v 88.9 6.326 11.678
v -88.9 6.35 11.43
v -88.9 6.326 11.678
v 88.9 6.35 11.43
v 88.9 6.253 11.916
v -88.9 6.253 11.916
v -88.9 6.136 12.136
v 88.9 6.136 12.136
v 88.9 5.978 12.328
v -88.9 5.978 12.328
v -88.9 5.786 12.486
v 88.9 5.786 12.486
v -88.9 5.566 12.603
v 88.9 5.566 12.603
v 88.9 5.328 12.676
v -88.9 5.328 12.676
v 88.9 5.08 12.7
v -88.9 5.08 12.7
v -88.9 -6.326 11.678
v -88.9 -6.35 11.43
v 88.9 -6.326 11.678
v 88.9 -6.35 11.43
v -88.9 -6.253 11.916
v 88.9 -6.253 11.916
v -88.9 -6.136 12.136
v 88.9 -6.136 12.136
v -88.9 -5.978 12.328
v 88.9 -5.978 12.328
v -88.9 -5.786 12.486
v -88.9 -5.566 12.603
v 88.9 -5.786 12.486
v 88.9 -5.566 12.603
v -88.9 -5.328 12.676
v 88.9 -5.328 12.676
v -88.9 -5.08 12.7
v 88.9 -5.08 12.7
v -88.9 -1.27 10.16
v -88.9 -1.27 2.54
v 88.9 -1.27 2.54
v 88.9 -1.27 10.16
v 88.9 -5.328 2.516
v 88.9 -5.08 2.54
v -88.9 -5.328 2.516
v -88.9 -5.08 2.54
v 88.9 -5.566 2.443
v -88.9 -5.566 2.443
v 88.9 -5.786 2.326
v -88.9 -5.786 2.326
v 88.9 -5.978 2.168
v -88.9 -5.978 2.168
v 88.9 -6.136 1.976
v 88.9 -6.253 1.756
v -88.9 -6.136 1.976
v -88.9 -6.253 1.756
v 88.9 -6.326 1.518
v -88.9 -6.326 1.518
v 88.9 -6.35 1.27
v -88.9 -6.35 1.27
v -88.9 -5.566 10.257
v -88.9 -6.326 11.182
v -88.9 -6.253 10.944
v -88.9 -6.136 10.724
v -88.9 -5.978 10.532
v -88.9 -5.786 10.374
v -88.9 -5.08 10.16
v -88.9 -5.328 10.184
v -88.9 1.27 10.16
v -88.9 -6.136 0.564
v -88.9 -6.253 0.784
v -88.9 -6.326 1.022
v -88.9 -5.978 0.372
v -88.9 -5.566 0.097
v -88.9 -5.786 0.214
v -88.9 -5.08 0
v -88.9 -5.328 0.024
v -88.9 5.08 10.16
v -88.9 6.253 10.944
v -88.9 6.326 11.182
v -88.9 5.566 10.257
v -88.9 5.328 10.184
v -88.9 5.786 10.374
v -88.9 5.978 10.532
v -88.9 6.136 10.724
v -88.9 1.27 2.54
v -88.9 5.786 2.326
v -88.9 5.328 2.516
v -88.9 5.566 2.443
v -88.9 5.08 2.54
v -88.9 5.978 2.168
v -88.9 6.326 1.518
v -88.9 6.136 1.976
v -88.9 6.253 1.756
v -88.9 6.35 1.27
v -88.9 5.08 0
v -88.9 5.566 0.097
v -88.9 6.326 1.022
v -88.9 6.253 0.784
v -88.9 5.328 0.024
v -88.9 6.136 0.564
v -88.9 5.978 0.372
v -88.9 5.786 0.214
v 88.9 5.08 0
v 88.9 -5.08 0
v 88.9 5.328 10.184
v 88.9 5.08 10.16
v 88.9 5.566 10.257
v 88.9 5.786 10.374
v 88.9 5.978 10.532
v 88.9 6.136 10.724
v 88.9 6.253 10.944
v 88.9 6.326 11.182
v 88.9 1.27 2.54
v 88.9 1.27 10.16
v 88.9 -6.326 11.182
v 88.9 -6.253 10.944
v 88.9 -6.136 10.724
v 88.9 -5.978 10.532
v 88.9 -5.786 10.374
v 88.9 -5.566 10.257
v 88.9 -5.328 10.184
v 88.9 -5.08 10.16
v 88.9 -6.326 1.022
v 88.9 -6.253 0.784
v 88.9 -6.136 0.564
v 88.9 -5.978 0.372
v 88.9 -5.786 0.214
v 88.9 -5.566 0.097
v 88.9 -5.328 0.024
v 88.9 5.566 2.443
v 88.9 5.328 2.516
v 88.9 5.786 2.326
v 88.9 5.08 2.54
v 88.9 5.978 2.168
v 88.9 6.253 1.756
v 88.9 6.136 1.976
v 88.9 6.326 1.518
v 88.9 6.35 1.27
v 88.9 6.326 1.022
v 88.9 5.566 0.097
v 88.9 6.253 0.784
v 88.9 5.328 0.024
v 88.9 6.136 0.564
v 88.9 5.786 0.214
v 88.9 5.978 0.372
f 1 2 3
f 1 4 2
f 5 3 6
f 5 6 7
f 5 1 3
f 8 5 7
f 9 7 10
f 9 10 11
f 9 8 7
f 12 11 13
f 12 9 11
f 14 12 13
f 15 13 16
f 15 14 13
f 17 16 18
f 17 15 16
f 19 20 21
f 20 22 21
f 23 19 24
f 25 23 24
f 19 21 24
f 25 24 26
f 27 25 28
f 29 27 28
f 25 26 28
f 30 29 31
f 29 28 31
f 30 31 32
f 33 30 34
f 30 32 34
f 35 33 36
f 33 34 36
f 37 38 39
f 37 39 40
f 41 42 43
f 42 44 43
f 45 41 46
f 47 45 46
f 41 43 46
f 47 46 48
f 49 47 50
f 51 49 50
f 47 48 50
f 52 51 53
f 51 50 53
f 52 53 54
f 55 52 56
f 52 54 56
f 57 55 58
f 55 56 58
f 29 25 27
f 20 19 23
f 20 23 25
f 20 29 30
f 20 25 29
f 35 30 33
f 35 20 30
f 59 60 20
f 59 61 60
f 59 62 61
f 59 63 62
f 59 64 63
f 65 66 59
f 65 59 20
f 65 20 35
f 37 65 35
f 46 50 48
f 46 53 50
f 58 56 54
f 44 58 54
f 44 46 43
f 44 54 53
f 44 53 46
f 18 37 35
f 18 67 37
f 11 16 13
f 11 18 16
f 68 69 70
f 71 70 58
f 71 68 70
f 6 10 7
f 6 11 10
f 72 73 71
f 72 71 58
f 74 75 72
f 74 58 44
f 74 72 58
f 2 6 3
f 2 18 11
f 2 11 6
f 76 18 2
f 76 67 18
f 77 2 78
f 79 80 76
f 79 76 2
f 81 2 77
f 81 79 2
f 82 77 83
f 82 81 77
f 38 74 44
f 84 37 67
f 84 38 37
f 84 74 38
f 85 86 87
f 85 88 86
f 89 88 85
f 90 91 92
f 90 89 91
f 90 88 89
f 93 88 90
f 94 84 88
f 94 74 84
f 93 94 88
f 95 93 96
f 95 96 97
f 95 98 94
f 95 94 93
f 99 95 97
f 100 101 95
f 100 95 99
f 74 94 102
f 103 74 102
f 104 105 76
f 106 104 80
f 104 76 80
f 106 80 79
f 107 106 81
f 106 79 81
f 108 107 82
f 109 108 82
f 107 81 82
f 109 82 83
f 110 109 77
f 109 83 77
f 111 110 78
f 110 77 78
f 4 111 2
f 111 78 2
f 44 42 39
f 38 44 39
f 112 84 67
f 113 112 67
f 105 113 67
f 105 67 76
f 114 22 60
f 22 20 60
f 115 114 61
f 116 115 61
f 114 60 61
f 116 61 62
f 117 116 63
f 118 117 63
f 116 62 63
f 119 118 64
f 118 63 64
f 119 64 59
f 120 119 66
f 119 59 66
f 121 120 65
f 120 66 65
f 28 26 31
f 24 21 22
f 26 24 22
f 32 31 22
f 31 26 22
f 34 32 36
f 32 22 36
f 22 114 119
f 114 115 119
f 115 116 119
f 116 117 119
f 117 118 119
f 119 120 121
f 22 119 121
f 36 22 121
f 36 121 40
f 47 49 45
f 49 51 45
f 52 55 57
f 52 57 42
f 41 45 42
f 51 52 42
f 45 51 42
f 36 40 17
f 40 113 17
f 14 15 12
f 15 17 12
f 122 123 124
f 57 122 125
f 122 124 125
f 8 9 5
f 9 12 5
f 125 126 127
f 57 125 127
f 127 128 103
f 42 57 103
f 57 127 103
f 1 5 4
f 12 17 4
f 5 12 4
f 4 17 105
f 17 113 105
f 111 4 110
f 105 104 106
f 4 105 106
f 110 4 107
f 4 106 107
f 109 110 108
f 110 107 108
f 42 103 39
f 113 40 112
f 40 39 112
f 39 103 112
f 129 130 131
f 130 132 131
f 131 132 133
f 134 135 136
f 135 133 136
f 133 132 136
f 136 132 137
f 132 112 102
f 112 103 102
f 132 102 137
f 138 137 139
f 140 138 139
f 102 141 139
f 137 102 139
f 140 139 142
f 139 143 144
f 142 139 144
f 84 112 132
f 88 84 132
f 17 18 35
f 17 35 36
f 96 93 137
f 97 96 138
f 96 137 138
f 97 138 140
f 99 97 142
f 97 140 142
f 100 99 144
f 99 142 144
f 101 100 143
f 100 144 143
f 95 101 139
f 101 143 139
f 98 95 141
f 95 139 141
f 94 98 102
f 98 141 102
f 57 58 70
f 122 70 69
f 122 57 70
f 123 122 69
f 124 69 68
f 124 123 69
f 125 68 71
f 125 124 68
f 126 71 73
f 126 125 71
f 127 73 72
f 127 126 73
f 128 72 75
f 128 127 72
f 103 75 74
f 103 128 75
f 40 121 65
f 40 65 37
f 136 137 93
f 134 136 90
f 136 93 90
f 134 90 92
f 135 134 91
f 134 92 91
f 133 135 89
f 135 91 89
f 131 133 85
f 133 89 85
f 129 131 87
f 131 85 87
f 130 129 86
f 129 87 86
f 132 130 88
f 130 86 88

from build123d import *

# Parameters (mm, degrees)
F0_W     = 177.8
F0_H     = 12.7
F1_DEPTH = 12.7
F2_R     = 1.27
F3_W     = 5.08
F3_H     = 7.62
F4_DEPTH = 177.8
F5_R     = 1.26999


# Not quite as in the source:
# - a fillet or chamfer is up to 0.001 mm smaller than in the source, because OpenCascade refuses the exact size


with BuildPart() as f1:
    # F0 (on Top) → F1 (new body)
    with BuildSketch(Plane.XY):
        Rectangle(F0_W, F0_H)
    extrude(amount=F1_DEPTH)

    # F2
    f2_edges = [f1.edges().sort_by_distance(p)[0] for p in [
        (0, 6.35, 0),
        (0, -6.35, 12.7),
        (0, -6.35, 0),
        (0, 6.35, 12.7),
    ]]
    fillet(f2_edges, radius=F2_R)

    # F3 (on face) → F4 (cut)
    with BuildSketch(Plane.YZ.offset(88.9)):
        with Locations((-3.81, 6.35)):
            Rectangle(F3_W, F3_H)
        with Locations((3.81, 6.35)):
            Rectangle(F3_W, F3_H)
    extrude(amount=-F4_DEPTH, mode=Mode.SUBTRACT)

    # F5 (radius 1.27 in the source; OpenCascade refuses exactly that, so slightly less here)
    f5_edges = [f1.edges().sort_by_distance(p)[0] for p in [
        (0, -6.35, 10.16),
        (0, -6.35, 2.54),
        (0, 6.35, 10.16),
        (0, 6.35, 2.54),
    ]]
    fillet(f5_edges, radius=F5_R)


solid = f1.part
